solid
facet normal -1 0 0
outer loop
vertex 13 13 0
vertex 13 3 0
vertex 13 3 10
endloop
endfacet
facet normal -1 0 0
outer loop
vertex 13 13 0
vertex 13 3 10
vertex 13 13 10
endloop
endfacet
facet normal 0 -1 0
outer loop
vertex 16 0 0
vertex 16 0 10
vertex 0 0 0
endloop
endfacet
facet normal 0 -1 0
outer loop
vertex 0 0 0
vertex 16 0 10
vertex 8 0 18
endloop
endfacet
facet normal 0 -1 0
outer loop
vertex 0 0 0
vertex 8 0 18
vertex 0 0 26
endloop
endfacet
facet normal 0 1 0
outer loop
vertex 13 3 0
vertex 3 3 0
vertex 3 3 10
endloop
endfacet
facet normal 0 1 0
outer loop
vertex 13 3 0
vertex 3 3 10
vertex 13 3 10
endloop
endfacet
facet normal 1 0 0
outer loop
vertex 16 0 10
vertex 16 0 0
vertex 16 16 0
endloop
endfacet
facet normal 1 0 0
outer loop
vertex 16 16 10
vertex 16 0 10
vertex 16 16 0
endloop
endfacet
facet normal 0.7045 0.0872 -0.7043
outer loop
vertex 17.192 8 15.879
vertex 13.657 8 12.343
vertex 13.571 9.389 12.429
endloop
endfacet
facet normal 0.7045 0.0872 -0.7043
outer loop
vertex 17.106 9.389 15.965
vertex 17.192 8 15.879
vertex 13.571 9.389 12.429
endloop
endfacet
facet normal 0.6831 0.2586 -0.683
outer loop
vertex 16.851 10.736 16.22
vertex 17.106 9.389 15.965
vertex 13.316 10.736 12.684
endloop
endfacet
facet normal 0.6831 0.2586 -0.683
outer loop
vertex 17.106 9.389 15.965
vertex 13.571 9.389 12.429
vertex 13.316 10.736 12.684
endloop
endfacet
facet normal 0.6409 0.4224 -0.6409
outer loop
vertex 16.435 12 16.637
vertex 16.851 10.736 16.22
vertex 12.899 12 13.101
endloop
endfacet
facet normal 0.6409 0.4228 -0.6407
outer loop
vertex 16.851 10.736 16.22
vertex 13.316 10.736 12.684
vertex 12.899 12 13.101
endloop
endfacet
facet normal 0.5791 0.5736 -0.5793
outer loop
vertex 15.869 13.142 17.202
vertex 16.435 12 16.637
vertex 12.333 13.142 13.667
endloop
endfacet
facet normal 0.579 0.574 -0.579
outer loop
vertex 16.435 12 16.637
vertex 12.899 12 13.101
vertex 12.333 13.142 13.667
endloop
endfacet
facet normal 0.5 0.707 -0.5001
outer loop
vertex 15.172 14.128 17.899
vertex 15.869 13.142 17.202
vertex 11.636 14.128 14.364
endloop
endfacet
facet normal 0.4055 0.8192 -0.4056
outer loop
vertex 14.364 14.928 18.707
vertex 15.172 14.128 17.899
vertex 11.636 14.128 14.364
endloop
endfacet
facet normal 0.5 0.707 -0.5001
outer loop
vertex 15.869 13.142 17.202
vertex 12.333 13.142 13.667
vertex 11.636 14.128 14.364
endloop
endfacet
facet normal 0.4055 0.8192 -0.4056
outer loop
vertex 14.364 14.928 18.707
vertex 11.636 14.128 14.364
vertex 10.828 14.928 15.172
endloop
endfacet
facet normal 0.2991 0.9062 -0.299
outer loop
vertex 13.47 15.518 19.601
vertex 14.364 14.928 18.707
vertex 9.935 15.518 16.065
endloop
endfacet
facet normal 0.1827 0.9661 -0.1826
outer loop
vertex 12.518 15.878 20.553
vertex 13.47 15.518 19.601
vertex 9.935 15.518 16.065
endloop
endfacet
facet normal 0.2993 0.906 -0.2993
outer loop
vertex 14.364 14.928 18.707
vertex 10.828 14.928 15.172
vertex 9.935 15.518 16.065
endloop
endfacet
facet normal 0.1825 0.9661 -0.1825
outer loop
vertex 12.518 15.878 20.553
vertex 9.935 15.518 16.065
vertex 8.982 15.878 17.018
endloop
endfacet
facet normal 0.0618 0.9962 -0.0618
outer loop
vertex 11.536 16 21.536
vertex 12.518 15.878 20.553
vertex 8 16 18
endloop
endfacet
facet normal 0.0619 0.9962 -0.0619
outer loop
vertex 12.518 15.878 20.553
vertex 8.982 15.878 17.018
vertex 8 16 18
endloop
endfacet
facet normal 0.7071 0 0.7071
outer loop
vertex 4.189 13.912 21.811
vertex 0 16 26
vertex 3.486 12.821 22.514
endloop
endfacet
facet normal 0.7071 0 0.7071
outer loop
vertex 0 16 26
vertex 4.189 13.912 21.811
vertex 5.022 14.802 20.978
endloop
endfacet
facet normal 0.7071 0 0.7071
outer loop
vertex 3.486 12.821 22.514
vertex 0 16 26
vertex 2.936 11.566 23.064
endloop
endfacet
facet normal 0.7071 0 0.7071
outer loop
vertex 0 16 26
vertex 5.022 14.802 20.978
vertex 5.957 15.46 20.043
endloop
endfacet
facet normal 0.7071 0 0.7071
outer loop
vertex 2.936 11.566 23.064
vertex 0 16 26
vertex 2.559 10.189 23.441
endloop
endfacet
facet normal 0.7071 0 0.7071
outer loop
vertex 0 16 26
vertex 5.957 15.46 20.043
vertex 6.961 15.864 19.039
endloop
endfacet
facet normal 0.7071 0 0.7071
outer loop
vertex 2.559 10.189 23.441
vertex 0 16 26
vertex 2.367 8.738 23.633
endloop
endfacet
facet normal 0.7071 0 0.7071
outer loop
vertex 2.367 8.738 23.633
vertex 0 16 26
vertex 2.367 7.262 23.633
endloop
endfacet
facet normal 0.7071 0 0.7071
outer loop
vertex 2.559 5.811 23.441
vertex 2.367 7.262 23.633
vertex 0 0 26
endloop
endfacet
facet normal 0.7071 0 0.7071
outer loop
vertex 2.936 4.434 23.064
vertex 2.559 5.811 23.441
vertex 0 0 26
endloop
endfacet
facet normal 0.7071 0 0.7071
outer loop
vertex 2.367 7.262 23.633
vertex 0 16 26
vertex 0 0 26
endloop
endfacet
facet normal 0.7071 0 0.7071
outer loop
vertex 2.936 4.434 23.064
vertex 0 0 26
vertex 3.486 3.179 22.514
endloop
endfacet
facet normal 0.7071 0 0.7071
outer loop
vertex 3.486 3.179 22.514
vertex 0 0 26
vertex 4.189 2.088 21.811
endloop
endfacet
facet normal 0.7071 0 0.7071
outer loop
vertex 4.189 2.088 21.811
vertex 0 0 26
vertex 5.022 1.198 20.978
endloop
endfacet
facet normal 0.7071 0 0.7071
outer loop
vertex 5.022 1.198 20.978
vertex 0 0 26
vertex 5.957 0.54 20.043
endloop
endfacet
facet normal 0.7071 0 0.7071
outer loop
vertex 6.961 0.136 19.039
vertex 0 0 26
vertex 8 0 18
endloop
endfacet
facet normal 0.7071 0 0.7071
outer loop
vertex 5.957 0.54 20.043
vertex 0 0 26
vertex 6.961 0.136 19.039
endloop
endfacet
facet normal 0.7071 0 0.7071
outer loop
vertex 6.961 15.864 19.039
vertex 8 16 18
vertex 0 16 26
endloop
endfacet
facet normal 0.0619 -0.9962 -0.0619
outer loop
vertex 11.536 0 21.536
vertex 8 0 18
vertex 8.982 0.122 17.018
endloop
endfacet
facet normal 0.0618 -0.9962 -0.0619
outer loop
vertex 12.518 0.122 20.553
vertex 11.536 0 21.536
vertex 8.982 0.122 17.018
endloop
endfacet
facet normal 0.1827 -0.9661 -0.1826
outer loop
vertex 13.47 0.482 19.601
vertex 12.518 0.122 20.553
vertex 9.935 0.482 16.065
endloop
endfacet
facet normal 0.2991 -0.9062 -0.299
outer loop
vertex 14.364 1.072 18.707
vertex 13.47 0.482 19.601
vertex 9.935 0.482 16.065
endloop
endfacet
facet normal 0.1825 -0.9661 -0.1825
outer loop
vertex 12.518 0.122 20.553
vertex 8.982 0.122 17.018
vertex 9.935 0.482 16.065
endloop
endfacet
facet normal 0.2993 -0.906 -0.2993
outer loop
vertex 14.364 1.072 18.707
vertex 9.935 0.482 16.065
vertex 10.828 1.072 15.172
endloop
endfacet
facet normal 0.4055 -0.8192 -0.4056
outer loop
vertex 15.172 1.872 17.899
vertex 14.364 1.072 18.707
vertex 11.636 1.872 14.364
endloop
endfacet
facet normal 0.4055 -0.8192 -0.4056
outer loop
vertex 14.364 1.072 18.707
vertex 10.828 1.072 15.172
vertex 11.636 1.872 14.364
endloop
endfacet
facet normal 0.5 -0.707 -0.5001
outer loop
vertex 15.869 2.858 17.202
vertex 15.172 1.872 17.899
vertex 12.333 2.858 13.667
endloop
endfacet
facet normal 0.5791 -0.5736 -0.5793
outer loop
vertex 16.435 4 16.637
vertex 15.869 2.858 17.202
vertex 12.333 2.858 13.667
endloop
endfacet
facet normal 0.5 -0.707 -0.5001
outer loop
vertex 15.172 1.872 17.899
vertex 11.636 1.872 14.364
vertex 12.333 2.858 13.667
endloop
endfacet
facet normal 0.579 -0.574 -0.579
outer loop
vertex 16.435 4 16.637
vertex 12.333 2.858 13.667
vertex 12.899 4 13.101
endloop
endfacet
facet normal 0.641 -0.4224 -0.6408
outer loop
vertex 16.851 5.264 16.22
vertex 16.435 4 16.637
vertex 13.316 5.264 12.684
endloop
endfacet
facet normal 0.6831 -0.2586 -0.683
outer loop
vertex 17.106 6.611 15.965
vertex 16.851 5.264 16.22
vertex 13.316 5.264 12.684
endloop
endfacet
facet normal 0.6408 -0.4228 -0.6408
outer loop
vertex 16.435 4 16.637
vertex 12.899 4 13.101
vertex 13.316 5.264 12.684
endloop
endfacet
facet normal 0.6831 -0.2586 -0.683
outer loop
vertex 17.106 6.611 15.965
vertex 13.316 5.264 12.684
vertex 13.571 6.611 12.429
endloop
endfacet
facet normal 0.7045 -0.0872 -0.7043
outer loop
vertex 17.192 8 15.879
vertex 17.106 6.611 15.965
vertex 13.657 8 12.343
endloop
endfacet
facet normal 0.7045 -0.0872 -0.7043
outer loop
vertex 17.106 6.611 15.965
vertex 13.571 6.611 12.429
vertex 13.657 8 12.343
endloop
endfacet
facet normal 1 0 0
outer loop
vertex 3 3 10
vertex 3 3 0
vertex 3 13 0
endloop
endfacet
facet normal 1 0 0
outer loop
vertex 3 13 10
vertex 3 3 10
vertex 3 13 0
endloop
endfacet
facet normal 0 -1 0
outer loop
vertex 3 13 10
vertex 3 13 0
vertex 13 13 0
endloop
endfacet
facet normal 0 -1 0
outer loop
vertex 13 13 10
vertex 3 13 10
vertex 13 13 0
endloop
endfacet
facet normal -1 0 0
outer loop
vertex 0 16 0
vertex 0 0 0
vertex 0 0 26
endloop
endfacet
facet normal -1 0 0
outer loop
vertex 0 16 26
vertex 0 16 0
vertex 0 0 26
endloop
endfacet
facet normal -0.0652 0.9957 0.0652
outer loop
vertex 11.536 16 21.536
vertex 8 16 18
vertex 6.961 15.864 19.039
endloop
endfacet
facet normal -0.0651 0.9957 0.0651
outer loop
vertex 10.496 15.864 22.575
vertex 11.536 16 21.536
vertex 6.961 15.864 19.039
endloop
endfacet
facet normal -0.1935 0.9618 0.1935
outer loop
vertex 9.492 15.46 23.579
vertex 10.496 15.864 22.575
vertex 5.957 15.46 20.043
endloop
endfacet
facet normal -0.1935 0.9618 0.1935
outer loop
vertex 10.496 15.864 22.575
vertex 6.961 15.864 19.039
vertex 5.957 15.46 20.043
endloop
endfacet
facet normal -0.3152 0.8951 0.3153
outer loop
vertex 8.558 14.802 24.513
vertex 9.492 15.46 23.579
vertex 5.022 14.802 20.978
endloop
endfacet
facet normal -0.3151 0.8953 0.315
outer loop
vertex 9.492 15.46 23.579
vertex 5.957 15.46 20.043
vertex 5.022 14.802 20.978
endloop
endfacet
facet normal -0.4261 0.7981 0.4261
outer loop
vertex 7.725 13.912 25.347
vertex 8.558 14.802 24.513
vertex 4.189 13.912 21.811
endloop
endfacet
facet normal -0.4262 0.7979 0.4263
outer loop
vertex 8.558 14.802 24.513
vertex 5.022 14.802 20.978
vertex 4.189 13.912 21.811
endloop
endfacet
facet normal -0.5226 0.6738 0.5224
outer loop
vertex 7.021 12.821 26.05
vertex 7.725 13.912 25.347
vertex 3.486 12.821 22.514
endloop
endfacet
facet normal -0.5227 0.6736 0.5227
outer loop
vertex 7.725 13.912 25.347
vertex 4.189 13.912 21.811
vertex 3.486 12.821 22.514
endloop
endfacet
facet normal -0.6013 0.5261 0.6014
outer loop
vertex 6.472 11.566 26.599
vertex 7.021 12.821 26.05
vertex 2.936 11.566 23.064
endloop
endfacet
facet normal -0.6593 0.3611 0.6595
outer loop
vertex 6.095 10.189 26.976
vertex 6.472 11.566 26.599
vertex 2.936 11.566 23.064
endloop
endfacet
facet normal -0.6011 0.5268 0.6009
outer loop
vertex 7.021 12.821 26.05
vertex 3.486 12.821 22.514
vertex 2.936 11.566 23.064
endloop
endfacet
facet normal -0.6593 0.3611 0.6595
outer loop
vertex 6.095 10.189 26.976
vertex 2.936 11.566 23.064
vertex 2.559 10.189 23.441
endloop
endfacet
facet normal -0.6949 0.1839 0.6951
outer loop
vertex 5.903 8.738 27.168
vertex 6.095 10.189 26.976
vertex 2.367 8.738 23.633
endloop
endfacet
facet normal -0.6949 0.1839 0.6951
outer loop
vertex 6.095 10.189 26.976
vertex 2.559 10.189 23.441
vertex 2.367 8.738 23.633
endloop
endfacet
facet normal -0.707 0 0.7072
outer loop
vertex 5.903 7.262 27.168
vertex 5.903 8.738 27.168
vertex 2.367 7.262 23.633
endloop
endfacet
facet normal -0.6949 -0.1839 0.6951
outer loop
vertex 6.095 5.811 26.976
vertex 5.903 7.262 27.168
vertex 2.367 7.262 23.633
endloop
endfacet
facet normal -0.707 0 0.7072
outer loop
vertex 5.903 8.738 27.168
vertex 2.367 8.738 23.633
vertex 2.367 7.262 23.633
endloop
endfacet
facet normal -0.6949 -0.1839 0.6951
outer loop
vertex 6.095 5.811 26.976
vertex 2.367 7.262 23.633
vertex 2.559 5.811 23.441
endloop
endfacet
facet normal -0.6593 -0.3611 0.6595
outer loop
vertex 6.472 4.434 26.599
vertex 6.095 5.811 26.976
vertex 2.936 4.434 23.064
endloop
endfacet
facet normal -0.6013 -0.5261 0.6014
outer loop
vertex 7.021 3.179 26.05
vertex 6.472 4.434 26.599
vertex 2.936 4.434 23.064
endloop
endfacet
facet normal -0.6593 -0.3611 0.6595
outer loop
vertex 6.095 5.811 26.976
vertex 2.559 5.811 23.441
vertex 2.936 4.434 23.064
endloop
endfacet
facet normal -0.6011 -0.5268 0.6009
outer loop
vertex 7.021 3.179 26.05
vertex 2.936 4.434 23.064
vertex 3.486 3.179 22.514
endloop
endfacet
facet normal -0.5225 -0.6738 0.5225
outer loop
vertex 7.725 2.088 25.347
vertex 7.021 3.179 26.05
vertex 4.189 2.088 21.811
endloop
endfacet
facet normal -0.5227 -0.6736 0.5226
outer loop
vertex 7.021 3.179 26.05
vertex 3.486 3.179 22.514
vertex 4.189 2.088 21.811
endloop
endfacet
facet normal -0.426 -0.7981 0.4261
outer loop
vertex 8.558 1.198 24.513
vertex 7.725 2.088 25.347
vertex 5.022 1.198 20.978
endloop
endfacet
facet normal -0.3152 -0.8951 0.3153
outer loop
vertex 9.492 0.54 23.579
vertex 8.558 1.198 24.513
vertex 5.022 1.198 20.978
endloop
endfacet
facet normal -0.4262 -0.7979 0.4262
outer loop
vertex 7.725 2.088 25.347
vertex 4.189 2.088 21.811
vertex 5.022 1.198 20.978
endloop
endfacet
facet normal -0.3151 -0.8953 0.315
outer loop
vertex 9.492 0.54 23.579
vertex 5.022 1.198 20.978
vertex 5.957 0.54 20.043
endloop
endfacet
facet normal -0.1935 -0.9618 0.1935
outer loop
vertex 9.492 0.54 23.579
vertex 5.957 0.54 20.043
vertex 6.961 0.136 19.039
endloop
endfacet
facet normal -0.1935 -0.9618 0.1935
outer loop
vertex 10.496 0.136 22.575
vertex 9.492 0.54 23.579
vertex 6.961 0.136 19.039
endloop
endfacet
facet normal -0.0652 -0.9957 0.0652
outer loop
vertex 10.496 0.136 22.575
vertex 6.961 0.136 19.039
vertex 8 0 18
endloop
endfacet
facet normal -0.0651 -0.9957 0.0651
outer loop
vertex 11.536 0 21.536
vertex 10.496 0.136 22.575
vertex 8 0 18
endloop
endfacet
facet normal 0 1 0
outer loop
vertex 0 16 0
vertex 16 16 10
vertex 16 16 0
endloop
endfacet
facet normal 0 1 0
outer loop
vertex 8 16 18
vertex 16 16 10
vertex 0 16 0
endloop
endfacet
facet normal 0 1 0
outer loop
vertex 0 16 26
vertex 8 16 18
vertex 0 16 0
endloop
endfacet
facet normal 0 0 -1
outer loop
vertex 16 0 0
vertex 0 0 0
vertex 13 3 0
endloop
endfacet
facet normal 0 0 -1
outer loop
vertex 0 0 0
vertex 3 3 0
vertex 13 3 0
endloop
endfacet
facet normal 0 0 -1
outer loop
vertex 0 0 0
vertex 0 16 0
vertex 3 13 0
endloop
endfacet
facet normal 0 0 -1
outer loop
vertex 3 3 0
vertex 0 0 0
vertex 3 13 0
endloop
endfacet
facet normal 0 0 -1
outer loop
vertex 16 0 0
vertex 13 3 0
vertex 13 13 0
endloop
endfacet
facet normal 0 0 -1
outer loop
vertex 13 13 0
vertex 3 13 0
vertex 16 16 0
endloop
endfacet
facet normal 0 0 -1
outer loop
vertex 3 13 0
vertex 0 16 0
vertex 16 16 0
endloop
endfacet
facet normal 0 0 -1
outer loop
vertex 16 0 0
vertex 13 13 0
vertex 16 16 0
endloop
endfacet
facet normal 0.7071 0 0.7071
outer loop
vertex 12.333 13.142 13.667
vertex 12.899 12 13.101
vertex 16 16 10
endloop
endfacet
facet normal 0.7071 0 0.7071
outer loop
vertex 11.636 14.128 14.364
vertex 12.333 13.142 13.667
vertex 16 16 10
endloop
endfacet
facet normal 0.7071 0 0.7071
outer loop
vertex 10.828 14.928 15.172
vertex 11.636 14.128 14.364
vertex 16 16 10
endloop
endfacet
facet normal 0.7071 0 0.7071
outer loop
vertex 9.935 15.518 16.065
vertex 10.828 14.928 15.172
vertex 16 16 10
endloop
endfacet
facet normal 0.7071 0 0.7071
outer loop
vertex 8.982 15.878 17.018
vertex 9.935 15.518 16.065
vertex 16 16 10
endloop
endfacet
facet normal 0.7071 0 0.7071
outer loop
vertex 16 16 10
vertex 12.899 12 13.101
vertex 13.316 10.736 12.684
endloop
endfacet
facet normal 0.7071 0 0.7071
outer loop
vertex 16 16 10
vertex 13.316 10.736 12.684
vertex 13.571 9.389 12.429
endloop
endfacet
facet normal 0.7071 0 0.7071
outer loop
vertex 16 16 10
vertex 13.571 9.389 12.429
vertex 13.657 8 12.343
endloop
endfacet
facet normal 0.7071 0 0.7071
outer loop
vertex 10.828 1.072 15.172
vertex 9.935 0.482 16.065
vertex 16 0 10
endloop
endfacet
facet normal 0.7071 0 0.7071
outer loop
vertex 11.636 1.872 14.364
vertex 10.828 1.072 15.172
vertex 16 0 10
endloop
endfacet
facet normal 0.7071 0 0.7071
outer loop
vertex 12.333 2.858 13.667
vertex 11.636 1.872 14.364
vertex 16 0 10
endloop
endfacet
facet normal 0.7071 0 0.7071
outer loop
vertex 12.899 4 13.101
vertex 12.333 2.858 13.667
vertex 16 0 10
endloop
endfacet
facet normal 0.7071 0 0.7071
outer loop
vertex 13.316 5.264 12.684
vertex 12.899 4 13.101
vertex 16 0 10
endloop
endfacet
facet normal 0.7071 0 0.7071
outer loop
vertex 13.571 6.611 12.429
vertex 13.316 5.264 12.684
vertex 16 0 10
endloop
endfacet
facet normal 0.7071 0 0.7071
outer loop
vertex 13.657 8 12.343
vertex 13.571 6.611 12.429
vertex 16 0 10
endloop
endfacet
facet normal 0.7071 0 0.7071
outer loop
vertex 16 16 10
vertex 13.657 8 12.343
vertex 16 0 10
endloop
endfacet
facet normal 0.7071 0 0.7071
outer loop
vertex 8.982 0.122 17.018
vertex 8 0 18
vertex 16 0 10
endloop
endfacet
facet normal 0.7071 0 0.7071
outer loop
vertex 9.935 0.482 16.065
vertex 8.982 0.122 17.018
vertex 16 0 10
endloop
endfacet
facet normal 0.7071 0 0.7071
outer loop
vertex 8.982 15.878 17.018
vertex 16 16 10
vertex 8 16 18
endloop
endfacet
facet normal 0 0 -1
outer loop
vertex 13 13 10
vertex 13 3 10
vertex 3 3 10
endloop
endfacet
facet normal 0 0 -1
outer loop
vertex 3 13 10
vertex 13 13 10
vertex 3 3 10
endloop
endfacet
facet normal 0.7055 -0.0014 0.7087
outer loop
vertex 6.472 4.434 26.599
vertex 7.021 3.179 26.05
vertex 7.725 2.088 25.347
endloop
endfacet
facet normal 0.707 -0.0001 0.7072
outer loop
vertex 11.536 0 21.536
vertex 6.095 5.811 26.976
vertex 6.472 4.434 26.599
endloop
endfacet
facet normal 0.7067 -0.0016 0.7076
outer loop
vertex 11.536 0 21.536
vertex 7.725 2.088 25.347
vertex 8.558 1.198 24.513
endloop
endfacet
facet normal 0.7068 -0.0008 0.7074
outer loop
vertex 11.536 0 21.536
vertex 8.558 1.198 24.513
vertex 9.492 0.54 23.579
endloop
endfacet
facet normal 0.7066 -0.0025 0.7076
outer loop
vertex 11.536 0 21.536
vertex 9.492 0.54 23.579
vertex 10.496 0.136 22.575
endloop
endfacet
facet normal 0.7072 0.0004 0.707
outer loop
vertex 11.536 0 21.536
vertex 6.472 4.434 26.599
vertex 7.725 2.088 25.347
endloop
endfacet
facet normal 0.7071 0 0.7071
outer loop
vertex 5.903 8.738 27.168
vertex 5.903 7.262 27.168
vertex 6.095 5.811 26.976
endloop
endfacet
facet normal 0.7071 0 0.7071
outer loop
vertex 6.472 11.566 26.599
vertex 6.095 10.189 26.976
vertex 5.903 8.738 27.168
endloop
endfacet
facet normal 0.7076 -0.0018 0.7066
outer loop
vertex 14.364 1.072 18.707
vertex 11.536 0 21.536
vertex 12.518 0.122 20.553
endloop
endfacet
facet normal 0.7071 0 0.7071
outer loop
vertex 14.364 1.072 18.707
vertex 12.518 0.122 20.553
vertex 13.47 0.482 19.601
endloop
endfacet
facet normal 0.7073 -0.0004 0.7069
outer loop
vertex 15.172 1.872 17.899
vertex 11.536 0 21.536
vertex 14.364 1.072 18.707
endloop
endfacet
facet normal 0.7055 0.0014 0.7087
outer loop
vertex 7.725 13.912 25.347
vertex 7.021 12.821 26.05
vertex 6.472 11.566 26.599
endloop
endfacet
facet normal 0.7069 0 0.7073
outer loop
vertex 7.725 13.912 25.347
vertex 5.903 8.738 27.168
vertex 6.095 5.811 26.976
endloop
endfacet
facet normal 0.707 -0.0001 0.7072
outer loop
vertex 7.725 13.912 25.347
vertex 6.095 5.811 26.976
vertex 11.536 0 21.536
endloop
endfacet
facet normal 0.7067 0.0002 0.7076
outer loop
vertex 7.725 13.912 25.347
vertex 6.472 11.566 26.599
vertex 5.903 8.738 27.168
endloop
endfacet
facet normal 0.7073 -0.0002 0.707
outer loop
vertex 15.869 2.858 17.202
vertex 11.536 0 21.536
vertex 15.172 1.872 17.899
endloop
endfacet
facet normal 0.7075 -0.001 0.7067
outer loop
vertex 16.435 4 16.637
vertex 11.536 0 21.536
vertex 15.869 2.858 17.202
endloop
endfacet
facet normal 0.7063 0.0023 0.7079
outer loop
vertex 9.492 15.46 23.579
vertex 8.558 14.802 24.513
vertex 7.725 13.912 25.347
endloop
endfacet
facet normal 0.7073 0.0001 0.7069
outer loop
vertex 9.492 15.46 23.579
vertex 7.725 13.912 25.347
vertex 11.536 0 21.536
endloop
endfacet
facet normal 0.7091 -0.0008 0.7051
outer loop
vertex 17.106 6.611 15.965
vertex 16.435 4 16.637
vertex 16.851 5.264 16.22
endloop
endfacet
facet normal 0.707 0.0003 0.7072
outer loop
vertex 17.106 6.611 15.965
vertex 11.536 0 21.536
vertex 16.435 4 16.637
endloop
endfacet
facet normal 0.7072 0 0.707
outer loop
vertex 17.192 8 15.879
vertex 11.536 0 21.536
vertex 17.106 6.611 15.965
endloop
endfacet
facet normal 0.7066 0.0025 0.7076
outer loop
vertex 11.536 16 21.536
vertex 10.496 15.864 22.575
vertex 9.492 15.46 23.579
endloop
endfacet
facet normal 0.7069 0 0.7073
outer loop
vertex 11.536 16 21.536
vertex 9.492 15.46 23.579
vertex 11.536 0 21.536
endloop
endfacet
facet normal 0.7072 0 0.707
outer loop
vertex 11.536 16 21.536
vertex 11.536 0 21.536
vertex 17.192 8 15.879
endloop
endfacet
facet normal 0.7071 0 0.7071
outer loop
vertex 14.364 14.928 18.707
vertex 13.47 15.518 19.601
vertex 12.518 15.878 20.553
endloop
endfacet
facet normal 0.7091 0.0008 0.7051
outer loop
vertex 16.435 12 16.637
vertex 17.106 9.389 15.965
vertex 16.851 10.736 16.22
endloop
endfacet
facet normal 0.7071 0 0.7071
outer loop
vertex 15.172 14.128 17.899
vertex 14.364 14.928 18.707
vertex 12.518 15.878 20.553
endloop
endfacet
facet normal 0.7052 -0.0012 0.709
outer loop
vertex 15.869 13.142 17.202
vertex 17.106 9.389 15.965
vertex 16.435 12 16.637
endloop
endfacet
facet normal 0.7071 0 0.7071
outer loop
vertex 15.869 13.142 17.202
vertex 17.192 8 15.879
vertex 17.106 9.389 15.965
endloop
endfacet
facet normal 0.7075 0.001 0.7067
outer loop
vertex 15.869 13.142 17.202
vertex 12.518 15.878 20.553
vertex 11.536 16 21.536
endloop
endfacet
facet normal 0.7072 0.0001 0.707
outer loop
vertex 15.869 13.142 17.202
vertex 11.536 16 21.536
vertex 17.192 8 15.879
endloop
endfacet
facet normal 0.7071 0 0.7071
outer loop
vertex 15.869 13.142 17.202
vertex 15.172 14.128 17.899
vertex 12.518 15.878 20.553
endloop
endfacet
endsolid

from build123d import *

# Parameters (mm, degrees)
SKETCH_1_W      = 16
SKETCH_1_H      = 16
SKETCH_1_W_2    = 10
SKETCH_1_H_2    = 10
EXTRUDE_1_DEPTH = 10
EXTRUDE_2_DEPTH = 16
EXTRUDE_3_DEPTH = 5


with BuildPart() as part:
    # 草图1 → 凸台-拉伸1 (new body)
    with BuildSketch(Plane.XY):
        with Locations((8, 8)):
            Rectangle(SKETCH_1_W, SKETCH_1_H)
        with Locations((8, 8)):
            Rectangle(SKETCH_1_W_2, SKETCH_1_H_2, mode=Mode.SUBTRACT)
    extrude(amount=EXTRUDE_1_DEPTH)

    # 草图2 → 凸台-拉伸2 (add)
    with BuildSketch(Plane.XZ):
        Polygon((0, 10), (0, 26), (16, 10), align=None)
    extrude(amount=-EXTRUDE_2_DEPTH)

    # 草图6 → 凸台-拉伸3 (add)
    with BuildSketch(Plane(origin=(13, 0, 13), x_dir=(0.7071067811865475, 0, -0.7071067811865477), z_dir=(0.7071067811865477, 0, 0.7071067811865475))):
        with BuildLine():
            ThreePointArc((-7.071067812, 16), (-15.071067812, 8), (-7.071067812, 0))
            Line((-7.071067812, 0), (-7.071067812, 16))
        make_face()
        with BuildLine():
            Line((-7.071067812, 16), (-7.071067812, 0))
            ThreePointArc((-7.071067812, 0), (-1.414213562, 2.343145751), (0.928932188, 8))
            ThreePointArc((0.928932188, 8), (-1.414213562, 13.656854249), (-7.071067812, 16))
        make_face()
    extrude(amount=EXTRUDE_3_DEPTH)


solid = part.part
